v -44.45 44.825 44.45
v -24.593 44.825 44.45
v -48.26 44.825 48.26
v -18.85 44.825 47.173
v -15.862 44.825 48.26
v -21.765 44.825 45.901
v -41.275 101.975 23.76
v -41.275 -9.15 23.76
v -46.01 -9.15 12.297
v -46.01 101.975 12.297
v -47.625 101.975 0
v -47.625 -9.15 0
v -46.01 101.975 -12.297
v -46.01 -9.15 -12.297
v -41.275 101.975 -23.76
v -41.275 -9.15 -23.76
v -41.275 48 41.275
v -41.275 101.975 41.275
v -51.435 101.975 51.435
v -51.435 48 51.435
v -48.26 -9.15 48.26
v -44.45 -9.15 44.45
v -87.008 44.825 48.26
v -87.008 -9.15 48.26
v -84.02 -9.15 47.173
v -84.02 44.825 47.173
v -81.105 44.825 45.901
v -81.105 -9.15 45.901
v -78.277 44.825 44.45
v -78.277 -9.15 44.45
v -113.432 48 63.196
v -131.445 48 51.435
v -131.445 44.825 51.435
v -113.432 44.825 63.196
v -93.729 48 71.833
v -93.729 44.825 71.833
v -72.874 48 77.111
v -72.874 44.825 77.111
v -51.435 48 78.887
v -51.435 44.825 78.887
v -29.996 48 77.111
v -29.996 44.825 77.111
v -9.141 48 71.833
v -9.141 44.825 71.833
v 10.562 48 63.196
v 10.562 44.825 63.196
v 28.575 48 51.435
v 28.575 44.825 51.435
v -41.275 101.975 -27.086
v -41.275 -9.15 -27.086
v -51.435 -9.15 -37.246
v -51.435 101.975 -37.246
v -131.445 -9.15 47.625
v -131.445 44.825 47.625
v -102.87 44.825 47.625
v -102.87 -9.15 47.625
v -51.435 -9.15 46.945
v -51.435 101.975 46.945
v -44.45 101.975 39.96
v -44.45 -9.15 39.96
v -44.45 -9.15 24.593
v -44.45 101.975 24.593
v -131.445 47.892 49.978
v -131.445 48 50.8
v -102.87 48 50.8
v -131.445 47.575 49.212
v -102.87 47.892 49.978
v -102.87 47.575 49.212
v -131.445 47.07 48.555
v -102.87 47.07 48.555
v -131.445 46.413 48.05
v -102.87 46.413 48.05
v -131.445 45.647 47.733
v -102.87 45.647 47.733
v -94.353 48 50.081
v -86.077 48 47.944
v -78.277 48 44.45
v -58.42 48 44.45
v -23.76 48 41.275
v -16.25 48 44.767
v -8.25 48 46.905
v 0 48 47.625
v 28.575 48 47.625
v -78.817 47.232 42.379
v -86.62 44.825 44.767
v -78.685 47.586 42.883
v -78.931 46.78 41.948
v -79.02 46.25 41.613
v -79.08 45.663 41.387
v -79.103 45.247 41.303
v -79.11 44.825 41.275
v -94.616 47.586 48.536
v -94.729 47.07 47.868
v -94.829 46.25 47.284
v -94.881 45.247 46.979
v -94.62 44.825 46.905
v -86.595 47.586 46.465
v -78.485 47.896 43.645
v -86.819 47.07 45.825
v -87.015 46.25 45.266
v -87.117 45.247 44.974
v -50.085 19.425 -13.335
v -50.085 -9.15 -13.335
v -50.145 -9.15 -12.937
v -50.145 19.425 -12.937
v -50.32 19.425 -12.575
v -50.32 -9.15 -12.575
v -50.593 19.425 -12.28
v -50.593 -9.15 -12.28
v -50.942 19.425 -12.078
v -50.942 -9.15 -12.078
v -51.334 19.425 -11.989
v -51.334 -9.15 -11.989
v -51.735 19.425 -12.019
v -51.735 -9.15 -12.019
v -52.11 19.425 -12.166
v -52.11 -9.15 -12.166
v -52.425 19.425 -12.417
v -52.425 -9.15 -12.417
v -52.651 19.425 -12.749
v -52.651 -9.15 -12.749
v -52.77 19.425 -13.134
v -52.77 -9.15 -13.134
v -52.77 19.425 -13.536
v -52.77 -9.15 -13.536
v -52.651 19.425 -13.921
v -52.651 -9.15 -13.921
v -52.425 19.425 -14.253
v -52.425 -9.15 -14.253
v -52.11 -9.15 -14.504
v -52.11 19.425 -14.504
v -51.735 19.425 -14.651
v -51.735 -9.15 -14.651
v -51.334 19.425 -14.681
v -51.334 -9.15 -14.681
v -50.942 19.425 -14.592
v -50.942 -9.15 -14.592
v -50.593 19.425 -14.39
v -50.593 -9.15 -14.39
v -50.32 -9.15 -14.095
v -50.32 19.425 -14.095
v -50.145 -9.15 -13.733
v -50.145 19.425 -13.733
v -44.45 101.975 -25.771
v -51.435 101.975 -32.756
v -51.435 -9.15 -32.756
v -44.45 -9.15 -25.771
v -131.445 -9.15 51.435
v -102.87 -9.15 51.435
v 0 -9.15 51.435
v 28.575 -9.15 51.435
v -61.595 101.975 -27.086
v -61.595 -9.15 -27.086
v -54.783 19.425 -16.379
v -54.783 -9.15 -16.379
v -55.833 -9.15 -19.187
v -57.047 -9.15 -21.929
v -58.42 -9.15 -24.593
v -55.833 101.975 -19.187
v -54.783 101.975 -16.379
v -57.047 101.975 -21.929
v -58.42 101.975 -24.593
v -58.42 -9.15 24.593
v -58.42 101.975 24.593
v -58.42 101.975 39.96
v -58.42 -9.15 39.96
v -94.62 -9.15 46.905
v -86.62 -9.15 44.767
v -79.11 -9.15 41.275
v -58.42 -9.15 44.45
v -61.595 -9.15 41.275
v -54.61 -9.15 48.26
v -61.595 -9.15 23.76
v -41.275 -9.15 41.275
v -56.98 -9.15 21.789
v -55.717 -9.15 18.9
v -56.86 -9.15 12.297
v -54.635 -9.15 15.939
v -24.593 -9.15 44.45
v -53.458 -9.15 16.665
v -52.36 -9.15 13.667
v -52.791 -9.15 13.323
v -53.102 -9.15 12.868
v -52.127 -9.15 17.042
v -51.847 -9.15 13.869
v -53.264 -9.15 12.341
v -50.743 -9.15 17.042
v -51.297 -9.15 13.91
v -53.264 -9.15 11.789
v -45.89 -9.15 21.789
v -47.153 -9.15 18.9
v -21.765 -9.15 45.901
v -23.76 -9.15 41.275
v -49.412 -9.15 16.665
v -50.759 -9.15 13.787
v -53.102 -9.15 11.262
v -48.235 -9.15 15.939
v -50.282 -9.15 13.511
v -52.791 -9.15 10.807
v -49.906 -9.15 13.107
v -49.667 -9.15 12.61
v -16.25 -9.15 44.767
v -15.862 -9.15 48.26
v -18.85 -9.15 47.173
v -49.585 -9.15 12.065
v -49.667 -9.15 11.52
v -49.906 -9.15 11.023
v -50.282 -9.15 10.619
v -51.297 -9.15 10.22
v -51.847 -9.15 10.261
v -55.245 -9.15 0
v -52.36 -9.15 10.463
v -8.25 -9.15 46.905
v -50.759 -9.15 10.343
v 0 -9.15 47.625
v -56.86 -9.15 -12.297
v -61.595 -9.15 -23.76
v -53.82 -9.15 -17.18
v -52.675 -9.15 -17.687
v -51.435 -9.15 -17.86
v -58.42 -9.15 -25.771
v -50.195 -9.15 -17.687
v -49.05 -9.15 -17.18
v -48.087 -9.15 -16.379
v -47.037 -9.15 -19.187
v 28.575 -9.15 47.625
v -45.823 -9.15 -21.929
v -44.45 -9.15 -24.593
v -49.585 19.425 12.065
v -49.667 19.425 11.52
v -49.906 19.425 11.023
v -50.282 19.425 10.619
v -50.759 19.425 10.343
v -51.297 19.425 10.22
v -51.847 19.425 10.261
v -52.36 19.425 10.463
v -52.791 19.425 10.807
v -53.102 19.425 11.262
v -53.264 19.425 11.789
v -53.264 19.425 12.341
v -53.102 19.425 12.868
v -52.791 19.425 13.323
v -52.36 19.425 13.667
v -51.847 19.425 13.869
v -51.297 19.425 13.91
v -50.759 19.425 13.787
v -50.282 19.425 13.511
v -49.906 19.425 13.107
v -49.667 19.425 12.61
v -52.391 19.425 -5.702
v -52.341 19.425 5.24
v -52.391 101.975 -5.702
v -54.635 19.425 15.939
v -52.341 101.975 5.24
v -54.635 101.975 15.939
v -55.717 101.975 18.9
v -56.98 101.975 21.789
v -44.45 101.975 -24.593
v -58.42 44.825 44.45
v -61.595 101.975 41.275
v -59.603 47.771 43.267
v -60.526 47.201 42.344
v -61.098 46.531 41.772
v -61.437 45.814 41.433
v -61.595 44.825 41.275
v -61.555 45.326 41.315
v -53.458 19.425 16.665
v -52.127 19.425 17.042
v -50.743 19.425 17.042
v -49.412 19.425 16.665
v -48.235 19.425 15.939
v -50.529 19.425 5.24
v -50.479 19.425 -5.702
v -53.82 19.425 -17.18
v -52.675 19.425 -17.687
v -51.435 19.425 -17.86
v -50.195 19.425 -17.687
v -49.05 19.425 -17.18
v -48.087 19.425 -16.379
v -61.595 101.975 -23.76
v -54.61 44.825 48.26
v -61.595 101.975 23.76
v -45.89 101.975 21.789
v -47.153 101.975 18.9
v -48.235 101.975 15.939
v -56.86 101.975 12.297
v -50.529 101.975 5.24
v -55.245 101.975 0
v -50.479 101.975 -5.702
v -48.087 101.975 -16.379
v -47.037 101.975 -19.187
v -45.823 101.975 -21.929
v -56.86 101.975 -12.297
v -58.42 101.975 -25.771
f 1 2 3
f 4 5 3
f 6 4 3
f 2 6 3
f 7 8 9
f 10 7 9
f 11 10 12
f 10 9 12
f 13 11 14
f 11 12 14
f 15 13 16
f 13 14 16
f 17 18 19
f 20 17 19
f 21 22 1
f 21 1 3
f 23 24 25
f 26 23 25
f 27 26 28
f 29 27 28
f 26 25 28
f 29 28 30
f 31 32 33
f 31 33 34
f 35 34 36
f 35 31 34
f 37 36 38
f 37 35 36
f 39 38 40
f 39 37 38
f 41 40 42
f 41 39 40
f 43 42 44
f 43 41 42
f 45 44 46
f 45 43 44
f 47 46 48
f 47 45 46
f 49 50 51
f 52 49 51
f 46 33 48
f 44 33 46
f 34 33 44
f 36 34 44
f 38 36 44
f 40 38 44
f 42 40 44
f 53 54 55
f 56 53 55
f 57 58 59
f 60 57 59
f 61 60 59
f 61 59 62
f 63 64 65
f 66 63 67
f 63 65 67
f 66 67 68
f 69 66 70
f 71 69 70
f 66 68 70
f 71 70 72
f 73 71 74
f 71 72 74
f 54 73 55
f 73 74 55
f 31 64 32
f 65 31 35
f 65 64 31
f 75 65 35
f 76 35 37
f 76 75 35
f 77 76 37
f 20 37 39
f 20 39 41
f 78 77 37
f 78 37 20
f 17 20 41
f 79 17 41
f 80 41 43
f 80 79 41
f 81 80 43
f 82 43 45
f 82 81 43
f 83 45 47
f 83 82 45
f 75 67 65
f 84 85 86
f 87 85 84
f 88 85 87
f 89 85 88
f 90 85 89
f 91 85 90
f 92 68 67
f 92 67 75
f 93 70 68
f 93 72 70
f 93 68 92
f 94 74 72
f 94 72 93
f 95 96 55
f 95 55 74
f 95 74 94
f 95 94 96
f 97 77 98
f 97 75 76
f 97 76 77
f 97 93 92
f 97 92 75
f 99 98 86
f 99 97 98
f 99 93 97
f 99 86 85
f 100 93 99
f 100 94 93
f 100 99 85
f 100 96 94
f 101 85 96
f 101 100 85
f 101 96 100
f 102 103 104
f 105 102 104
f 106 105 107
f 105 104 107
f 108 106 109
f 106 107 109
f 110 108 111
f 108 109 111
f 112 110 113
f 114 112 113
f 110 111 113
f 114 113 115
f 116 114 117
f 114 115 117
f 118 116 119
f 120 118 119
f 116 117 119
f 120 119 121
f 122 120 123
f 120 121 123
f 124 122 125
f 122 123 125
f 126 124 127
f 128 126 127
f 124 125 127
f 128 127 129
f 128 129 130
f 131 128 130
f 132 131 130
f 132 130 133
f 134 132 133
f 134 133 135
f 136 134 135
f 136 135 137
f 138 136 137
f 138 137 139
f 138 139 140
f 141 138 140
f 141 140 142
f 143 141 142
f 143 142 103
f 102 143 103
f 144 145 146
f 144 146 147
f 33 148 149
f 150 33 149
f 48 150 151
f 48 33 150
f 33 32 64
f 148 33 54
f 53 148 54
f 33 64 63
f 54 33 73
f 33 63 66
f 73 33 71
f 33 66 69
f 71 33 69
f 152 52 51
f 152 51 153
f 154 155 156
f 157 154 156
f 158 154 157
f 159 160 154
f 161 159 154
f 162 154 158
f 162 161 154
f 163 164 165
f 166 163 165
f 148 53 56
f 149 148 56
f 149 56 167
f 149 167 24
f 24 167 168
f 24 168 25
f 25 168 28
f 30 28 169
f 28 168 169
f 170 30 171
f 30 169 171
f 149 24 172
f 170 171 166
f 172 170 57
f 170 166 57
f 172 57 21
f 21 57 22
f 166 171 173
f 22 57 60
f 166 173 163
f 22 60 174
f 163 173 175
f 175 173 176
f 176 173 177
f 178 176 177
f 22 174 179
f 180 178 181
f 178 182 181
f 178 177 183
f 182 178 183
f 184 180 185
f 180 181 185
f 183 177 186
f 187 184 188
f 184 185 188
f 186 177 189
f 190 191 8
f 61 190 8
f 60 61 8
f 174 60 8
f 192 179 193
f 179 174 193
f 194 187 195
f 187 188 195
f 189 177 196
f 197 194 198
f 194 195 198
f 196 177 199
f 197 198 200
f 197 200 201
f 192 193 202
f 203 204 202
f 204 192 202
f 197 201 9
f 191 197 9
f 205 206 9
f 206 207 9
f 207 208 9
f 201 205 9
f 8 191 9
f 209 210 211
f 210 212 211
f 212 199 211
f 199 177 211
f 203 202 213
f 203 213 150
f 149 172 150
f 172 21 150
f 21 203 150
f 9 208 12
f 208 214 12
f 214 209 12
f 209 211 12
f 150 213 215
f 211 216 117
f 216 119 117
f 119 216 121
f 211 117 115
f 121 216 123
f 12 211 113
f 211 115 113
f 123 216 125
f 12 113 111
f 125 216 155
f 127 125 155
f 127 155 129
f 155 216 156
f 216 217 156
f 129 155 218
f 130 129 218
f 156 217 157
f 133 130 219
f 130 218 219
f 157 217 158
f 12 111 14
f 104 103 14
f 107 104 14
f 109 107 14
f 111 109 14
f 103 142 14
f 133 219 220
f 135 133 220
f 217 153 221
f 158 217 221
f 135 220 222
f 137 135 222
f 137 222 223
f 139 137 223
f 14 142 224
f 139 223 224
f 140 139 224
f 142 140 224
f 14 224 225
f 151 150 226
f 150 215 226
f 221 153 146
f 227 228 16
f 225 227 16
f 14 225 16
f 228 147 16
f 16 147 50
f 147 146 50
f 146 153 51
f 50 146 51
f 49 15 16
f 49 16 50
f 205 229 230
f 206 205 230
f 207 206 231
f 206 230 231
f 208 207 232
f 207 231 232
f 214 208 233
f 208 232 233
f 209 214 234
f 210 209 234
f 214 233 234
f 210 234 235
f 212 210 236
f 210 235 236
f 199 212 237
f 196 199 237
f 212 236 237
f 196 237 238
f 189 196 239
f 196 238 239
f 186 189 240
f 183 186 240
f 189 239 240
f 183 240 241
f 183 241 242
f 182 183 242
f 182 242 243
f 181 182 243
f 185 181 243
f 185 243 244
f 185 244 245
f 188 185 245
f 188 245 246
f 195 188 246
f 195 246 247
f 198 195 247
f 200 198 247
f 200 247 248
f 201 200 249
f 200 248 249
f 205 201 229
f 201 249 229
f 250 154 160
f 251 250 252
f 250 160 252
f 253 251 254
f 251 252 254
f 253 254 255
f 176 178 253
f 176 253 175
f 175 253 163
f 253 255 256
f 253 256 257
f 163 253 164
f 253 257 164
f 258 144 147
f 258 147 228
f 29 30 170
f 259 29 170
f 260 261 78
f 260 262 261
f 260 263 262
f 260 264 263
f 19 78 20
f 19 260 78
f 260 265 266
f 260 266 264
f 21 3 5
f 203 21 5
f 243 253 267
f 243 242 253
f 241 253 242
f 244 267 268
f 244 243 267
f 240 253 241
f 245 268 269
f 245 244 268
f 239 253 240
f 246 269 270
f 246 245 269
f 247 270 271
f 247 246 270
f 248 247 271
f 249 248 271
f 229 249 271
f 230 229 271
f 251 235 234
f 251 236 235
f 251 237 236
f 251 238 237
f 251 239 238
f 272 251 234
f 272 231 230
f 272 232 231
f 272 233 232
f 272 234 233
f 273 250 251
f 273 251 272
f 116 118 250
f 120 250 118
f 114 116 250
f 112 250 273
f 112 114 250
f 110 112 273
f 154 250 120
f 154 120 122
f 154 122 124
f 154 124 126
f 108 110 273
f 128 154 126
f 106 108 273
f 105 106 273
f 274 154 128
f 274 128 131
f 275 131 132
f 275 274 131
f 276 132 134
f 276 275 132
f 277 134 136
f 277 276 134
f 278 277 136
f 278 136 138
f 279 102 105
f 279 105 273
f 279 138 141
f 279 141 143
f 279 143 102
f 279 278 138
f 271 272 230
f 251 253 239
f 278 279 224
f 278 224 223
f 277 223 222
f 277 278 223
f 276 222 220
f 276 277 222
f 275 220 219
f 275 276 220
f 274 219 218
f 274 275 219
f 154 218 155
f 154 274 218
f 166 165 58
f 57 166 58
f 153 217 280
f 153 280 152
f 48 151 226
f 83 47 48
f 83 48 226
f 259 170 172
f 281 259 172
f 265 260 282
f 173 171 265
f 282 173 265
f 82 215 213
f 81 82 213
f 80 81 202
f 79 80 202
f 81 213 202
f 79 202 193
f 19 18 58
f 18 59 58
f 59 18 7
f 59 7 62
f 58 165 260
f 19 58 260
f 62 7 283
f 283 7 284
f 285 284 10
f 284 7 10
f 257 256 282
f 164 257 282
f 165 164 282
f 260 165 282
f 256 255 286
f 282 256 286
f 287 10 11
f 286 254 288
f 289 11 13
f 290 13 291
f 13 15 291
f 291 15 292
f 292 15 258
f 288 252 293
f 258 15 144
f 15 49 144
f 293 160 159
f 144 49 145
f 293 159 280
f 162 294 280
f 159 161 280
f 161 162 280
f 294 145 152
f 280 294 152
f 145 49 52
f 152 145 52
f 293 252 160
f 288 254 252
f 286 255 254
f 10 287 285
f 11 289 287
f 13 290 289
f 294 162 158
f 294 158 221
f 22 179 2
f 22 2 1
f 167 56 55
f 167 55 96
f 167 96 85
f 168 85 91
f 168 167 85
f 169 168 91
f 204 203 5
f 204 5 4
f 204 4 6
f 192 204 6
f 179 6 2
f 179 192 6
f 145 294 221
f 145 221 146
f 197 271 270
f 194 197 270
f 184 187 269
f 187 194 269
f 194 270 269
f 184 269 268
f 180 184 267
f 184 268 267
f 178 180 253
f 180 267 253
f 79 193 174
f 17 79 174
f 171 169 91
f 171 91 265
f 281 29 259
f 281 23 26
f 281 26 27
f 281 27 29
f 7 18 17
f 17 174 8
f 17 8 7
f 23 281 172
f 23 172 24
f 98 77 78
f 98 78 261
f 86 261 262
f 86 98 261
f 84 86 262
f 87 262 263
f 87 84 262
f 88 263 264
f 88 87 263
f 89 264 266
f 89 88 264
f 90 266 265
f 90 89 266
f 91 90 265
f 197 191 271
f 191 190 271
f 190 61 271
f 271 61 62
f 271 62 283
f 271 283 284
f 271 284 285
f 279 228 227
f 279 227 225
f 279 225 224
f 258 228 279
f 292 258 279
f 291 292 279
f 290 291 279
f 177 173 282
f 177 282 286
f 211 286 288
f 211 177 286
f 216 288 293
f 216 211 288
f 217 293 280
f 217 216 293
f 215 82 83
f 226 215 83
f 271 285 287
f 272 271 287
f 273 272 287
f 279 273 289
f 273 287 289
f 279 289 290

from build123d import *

# Parameters (mm, degrees)
BOSS_EXTRUDE2_START     = -9.15
BOSS_EXTRUDE2_DEPTH     = 111.125
CUT_EXTRUDE2_DEPTH      = 53.975
SKETCH16_R              = 1.349999967
CUT_EXTRUDE3_DEPTH      = 112.125
CUT_EXTRUDE4_DEPTH      = 112.125000012
SKETCH22_R              = 1.849999983
CUT_EXTRUDE7_DEPTH      = 102.975000012
CUT_EXTRUDE7_DEPTH_BACK = 10.15
SKETCH23_W              = 28.575
SKETCH23_H              = 3.81
BOSS_EXTRUDE3_DEPTH     = 57.15
BOSS_EXTRUDE4_DEPTH     = 3.175
FILLET1_R               = 3.175
CUT_EXTRUDE8_DEPTH      = 112.125000012
CUT_EXTRUDE9_DEPTH      = 53.975
CUT_EXTRUDE12_DEPTH     = 82.55


with BuildPart() as part:
    # Sketch13 → Boss-Extrude2 (new body)
    with BuildSketch(Plane(origin=(0, 0, 0), x_dir=(1, 0, 0), z_dir=(0, 1, 0)).offset(BOSS_EXTRUDE2_START)):
        with BuildLine():
            Line((-51.435, -51.435), (0, -51.435))
            Line((0, -51.435), (0, -47.625))
            ThreePointArc((0, -47.625), (-12.296722124, -46.010121169), (-23.759524406, -41.275))
            Line((-23.759524406, -41.275), (-41.275, -41.275))
            Line((-41.275, -41.275), (-41.275, -23.759524406))
            ThreePointArc((-41.275, -23.759524406), (-47.625, 0), (-41.275, 23.759524406))
            Line((-41.275, 23.759524406), (-41.275, 41.275))
            Line((-41.275, 41.275), (-51.435, 51.435))
            Line((-51.435, 51.435), (-51.435, -51.435))
        make_face()
    boss_extrude2 = extrude(amount=BOSS_EXTRUDE2_DEPTH)

    # Sketch15 → Cut-Extrude2 (cut)
    with BuildSketch(Plane(origin=(0, 101.975000012, 0), x_dir=(1, 0, 0), z_dir=(0, 1, 0))):
        Polygon((0, 0), (-51.435, -51.435), (0, -51.435), align=None)
    cut_extrude2 = extrude(amount=-CUT_EXTRUDE2_DEPTH, mode=Mode.SUBTRACT)

    # Mirror1: Boss-Extrude2, Cut-Extrude2 across plane
    add(boss_extrude2.mirror(Plane(origin=(-51.435, 101.975000012, 51.435), x_dir=(0, 0, 1), z_dir=(1, 0, 0))))
    add(cut_extrude2.mirror(Plane(origin=(-51.435, 101.975000012, 51.435), x_dir=(0, 0, 1), z_dir=(1, 0, 0))), mode=Mode.SUBTRACT)

    # Sketch16 → Cut-Extrude3 (cut, through all)
    with BuildSketch(Plane.XZ.offset(9.149999988)):
        with Locations((-51.435, -13.335)):
            Circle(SKETCH16_R)
    extrude(amount=-CUT_EXTRUDE3_DEPTH, mode=Mode.SUBTRACT)

    # Sketch17 → Cut-Extrude4 (cut, through all)
    with BuildSketch(Plane(origin=(0, 101.975000012, 0), x_dir=(1, 0, 0), z_dir=(0, 1, 0))):
        Polygon((7.094402336, 7.094402336), (-7.094402336, -7.094402336), (-51.435, 37.246195329), (-95.775597664, -7.094402336), (-109.964402336, 7.094402336), (-58.529402336, 58.529402336), (-51.435, 51.435), (-44.340597664, 58.529402336), align=None)
    extrude(amount=-CUT_EXTRUDE4_DEPTH, mode=Mode.SUBTRACT)

    # Sketch22 → Cut-Extrude7 (cut, two sides)
    with BuildSketch(Plane(origin=(0, 0, 0), x_dir=(1, 0, 0), z_dir=(0, 1, 0))) as cut_extrude7_sk:
        with Locations((-51.435, -12.065)):
            Circle(SKETCH22_R)
    extrude(amount=CUT_EXTRUDE7_DEPTH, mode=Mode.SUBTRACT)
    extrude(cut_extrude7_sk.sketch, amount=-CUT_EXTRUDE7_DEPTH_BACK, mode=Mode.SUBTRACT)

    # Sketch23 → Boss-Extrude3 (add)
    with BuildSketch(Plane(origin=(0, 48.000000012, 0), x_dir=(1, 0, 0), z_dir=(0, 1, 0))):
        with Locations((14.2875, -49.53)):
            Rectangle(SKETCH23_W, SKETCH23_H)
        with Locations((-117.1575, -49.53)):
            Rectangle(SKETCH23_W, SKETCH23_H)
    extrude(amount=-BOSS_EXTRUDE3_DEPTH)

    # Sketch24 → Boss-Extrude4 (add)
    with BuildSketch(Plane(origin=(0, 48.000000012, 0), x_dir=(1, 0, 0), z_dir=(0, 1, 0))):
        with BuildLine():
            Line((28.575, -51.435), (-131.445, -51.435))
            ThreePointArc((-131.445, -51.435), (-51.435, -78.887051089), (28.575, -51.435))
        make_face()
    extrude(amount=-BOSS_EXTRUDE4_DEPTH)

    # Fillet1
    fillet1_edges = [part.edges().sort_by_distance(p)[0] for p in [
        (-117.1575, 48.000000012, 47.625),
        (-70.352737797, 48.000000012, 41.275),
        (-90.573277876, 48.000000012, 46.010121169),
    ]]
    fillet(fillet1_edges, radius=FILLET1_R)

    # Sketch25 → Cut-Extrude8 (cut, through all)
    with BuildSketch(Plane(origin=(0, 101.975000012, 0), x_dir=(1, 0, 0), z_dir=(0, 1, 0))):
        with BuildLine():
            Line((-58.42, -24.593444248), (-58.42, -39.959871939))
            Line((-58.42, -39.959871939), (-51.435, -46.944871939))
            Line((-51.435, -46.944871939), (-44.45, -39.959871939))
            Line((-44.45, -39.959871939), (-44.45, -24.593444248))
            ThreePointArc((-44.45, -24.593444248), (-46.543928705, -20.354427055), (-48.234688479, -15.939097443))
            ThreePointArc((-48.234688479, -15.939097443), (-51.435, -17.089999983), (-54.635311521, -15.939097443))
            ThreePointArc((-54.635311521, -15.939097443), (-56.326071295, -20.354427055), (-58.42, -24.593444248))
        make_face()
        with BuildLine():
            Line((-44.45, 25.771067268), (-44.45, 24.593444248))
            ThreePointArc((-44.45, 24.593444248), (-46.450454829, 20.566848232), (-48.087042692, 16.379142993))
            ThreePointArc((-48.087042692, 16.379142993), (-51.435, 17.859999967), (-54.782957308, 16.379142993))
            ThreePointArc((-54.782957308, 16.379142993), (-56.419545171, 20.566848232), (-58.42, 24.593444248))
            Line((-58.42, 24.593444248), (-58.42, 25.771067268))
            Line((-58.42, 25.771067268), (-51.435, 32.756067268))
            Line((-51.435, 32.756067268), (-44.45, 25.771067268))
        make_face()
    extrude(amount=-CUT_EXTRUDE8_DEPTH, mode=Mode.SUBTRACT)

    # Sketch26 → Cut-Extrude9 (cut)
    with BuildSketch(Plane.XZ.offset(9.149999988)):
        with BuildLine():
            Line((-44.45, 44.45), (-48.26, 48.26))
            Line((-48.26, 48.26), (-15.862294916, 48.26))
            ThreePointArc((-15.862294916, 48.26), (-20.317375146, 46.560114553), (-24.593444248, 44.45))
            Line((-24.593444248, 44.45), (-44.45, 44.45))
        make_face()
        with BuildLine():
            Line((-58.42, 44.45), (-54.61, 48.26))
            Line((-54.61, 48.26), (-87.007705084, 48.26))
            ThreePointArc((-87.007705084, 48.26), (-82.552624854, 46.560114553), (-78.276555752, 44.45))
            Line((-78.276555752, 44.45), (-58.42, 44.45))
        make_face()
    extrude(amount=-CUT_EXTRUDE9_DEPTH, mode=Mode.SUBTRACT)

    # Sketch30 → Cut-Extrude12 (cut)
    with BuildSketch(Plane(origin=(0, 101.975000012, 0), x_dir=(1, 0, 0), z_dir=(0, 1, 0))):
        with BuildLine():
            Line((-44.45, 25.771067268), (-51.435, 32.756067268))
            Line((-51.435, 32.756067268), (-58.42, 25.771067268))
            Line((-58.42, 25.771067268), (-58.42, 24.593444248))
            ThreePointArc((-58.42, 24.593444248), (-52.07, 0), (-58.42, -24.593444248))
            Line((-58.42, -24.593444248), (-58.42, -39.959871939))
            Line((-58.42, -39.959871939), (-51.435, -46.944871939))
            Line((-51.435, -46.944871939), (-44.45, -39.959871939))
            Line((-44.45, -39.959871939), (-44.45, -24.593444248))
            ThreePointArc((-44.45, -24.593444248), (-50.8, 0), (-44.45, 24.593444248))
            Line((-44.45, 24.593444248), (-44.45, 25.771067268))
        make_face()
    extrude(amount=-CUT_EXTRUDE12_DEPTH, mode=Mode.SUBTRACT)


solid = part.part
